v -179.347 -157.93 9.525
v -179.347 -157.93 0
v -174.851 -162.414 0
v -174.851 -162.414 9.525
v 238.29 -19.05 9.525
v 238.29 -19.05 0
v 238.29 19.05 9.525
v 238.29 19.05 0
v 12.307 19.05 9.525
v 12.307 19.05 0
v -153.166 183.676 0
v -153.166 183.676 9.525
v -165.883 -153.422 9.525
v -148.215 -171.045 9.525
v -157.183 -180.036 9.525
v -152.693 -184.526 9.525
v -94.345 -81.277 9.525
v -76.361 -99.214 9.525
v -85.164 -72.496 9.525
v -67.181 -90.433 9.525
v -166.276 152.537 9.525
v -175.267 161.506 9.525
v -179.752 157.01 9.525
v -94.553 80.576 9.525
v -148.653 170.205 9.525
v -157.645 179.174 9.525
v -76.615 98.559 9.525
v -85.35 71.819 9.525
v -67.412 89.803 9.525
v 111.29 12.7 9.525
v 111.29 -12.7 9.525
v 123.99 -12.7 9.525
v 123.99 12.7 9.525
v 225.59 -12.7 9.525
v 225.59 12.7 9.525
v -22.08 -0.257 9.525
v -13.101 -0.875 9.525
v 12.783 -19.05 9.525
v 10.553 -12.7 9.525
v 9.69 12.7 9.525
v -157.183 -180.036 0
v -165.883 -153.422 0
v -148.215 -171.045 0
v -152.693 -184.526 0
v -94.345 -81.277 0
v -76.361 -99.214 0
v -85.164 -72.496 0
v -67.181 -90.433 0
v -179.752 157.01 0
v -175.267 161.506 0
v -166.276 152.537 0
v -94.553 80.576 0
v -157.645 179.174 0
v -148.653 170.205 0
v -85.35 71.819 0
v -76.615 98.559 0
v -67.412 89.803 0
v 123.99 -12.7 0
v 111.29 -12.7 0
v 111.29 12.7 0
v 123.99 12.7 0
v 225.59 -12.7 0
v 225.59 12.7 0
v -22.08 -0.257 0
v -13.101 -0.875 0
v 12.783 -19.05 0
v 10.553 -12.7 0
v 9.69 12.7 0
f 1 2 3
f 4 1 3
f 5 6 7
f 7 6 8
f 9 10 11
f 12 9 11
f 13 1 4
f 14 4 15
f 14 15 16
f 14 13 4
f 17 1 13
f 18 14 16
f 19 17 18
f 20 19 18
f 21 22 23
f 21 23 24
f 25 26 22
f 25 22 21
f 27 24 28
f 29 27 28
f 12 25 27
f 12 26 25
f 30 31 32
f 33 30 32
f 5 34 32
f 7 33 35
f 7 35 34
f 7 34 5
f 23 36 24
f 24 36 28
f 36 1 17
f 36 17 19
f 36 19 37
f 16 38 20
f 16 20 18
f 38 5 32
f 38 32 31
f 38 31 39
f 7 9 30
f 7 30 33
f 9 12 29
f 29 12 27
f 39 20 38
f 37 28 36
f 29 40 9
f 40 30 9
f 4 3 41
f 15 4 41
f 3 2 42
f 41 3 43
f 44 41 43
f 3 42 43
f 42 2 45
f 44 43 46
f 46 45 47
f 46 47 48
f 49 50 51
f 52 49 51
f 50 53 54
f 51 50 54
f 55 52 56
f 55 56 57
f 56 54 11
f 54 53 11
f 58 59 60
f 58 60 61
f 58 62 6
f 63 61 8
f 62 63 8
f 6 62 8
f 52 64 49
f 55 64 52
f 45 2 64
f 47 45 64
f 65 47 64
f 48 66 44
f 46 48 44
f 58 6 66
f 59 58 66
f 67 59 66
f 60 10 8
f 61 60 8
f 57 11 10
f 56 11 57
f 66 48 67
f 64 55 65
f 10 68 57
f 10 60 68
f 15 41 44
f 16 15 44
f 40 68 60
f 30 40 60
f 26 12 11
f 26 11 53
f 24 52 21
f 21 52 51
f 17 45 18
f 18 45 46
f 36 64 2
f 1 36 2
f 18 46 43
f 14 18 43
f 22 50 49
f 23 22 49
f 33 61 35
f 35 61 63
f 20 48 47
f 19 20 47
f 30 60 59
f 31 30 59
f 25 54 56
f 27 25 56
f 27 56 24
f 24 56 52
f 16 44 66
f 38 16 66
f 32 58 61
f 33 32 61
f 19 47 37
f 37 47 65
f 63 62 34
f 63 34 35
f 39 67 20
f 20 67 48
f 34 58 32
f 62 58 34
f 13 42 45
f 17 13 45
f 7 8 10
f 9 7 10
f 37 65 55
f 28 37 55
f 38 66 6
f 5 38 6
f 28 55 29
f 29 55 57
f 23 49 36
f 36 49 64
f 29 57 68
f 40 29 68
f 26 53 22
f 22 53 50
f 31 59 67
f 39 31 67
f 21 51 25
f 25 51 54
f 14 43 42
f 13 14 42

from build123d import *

# Parameters (mm, degrees)
F0_W     = 101.6
F0_H     = 25.4
F1_DEPTH = 9.525


with BuildPart() as f1:
    # F0 (on Top) → F1 (new body)
    with BuildSketch(Plane.XY):
        Polygon((-157.645054, 179.173873), (-175.267478, 161.506097), (-179.751833, 157.010203), (-22.079604, -0.257338), (-179.347144, -157.929566), (-174.851251, -162.413921), (-157.183479, -180.03635), (-152.693351, -184.526479), (12.783127, -19.05), (238.290359, -19.05), (238.290359, -12.7), (238.290359, 12.7), (238.290359, 19.05), (12.307383, 19.05), (-153.16648, 183.675526), align=None)
        Polygon((-165.882541, -153.422133), (-94.344681, -81.276558), (-76.361107, -99.213979), (-148.214769, -171.044564), align=None, mode=Mode.SUBTRACT)
        Polygon((-67.180604, -90.433441), (-85.164157, -72.496041), (-13.101294, -0.875487), (-85.349598, 71.819004), (-67.412202, 89.802561), (9.690359, 12.7), (111.290359, 12.7), (111.290359, -12.7), (10.552837, -12.7), align=None, mode=Mode.SUBTRACT)
        Polygon((-76.61524, 98.559477), (-94.552657, 80.575898), (-166.27569, 152.537388), (-148.653264, 170.205165), align=None, mode=Mode.SUBTRACT)
        with Locations((174.790359, 0)):
            Rectangle(F0_W, F0_H, mode=Mode.SUBTRACT)
    extrude(amount=F1_DEPTH)


solid = f1.part
